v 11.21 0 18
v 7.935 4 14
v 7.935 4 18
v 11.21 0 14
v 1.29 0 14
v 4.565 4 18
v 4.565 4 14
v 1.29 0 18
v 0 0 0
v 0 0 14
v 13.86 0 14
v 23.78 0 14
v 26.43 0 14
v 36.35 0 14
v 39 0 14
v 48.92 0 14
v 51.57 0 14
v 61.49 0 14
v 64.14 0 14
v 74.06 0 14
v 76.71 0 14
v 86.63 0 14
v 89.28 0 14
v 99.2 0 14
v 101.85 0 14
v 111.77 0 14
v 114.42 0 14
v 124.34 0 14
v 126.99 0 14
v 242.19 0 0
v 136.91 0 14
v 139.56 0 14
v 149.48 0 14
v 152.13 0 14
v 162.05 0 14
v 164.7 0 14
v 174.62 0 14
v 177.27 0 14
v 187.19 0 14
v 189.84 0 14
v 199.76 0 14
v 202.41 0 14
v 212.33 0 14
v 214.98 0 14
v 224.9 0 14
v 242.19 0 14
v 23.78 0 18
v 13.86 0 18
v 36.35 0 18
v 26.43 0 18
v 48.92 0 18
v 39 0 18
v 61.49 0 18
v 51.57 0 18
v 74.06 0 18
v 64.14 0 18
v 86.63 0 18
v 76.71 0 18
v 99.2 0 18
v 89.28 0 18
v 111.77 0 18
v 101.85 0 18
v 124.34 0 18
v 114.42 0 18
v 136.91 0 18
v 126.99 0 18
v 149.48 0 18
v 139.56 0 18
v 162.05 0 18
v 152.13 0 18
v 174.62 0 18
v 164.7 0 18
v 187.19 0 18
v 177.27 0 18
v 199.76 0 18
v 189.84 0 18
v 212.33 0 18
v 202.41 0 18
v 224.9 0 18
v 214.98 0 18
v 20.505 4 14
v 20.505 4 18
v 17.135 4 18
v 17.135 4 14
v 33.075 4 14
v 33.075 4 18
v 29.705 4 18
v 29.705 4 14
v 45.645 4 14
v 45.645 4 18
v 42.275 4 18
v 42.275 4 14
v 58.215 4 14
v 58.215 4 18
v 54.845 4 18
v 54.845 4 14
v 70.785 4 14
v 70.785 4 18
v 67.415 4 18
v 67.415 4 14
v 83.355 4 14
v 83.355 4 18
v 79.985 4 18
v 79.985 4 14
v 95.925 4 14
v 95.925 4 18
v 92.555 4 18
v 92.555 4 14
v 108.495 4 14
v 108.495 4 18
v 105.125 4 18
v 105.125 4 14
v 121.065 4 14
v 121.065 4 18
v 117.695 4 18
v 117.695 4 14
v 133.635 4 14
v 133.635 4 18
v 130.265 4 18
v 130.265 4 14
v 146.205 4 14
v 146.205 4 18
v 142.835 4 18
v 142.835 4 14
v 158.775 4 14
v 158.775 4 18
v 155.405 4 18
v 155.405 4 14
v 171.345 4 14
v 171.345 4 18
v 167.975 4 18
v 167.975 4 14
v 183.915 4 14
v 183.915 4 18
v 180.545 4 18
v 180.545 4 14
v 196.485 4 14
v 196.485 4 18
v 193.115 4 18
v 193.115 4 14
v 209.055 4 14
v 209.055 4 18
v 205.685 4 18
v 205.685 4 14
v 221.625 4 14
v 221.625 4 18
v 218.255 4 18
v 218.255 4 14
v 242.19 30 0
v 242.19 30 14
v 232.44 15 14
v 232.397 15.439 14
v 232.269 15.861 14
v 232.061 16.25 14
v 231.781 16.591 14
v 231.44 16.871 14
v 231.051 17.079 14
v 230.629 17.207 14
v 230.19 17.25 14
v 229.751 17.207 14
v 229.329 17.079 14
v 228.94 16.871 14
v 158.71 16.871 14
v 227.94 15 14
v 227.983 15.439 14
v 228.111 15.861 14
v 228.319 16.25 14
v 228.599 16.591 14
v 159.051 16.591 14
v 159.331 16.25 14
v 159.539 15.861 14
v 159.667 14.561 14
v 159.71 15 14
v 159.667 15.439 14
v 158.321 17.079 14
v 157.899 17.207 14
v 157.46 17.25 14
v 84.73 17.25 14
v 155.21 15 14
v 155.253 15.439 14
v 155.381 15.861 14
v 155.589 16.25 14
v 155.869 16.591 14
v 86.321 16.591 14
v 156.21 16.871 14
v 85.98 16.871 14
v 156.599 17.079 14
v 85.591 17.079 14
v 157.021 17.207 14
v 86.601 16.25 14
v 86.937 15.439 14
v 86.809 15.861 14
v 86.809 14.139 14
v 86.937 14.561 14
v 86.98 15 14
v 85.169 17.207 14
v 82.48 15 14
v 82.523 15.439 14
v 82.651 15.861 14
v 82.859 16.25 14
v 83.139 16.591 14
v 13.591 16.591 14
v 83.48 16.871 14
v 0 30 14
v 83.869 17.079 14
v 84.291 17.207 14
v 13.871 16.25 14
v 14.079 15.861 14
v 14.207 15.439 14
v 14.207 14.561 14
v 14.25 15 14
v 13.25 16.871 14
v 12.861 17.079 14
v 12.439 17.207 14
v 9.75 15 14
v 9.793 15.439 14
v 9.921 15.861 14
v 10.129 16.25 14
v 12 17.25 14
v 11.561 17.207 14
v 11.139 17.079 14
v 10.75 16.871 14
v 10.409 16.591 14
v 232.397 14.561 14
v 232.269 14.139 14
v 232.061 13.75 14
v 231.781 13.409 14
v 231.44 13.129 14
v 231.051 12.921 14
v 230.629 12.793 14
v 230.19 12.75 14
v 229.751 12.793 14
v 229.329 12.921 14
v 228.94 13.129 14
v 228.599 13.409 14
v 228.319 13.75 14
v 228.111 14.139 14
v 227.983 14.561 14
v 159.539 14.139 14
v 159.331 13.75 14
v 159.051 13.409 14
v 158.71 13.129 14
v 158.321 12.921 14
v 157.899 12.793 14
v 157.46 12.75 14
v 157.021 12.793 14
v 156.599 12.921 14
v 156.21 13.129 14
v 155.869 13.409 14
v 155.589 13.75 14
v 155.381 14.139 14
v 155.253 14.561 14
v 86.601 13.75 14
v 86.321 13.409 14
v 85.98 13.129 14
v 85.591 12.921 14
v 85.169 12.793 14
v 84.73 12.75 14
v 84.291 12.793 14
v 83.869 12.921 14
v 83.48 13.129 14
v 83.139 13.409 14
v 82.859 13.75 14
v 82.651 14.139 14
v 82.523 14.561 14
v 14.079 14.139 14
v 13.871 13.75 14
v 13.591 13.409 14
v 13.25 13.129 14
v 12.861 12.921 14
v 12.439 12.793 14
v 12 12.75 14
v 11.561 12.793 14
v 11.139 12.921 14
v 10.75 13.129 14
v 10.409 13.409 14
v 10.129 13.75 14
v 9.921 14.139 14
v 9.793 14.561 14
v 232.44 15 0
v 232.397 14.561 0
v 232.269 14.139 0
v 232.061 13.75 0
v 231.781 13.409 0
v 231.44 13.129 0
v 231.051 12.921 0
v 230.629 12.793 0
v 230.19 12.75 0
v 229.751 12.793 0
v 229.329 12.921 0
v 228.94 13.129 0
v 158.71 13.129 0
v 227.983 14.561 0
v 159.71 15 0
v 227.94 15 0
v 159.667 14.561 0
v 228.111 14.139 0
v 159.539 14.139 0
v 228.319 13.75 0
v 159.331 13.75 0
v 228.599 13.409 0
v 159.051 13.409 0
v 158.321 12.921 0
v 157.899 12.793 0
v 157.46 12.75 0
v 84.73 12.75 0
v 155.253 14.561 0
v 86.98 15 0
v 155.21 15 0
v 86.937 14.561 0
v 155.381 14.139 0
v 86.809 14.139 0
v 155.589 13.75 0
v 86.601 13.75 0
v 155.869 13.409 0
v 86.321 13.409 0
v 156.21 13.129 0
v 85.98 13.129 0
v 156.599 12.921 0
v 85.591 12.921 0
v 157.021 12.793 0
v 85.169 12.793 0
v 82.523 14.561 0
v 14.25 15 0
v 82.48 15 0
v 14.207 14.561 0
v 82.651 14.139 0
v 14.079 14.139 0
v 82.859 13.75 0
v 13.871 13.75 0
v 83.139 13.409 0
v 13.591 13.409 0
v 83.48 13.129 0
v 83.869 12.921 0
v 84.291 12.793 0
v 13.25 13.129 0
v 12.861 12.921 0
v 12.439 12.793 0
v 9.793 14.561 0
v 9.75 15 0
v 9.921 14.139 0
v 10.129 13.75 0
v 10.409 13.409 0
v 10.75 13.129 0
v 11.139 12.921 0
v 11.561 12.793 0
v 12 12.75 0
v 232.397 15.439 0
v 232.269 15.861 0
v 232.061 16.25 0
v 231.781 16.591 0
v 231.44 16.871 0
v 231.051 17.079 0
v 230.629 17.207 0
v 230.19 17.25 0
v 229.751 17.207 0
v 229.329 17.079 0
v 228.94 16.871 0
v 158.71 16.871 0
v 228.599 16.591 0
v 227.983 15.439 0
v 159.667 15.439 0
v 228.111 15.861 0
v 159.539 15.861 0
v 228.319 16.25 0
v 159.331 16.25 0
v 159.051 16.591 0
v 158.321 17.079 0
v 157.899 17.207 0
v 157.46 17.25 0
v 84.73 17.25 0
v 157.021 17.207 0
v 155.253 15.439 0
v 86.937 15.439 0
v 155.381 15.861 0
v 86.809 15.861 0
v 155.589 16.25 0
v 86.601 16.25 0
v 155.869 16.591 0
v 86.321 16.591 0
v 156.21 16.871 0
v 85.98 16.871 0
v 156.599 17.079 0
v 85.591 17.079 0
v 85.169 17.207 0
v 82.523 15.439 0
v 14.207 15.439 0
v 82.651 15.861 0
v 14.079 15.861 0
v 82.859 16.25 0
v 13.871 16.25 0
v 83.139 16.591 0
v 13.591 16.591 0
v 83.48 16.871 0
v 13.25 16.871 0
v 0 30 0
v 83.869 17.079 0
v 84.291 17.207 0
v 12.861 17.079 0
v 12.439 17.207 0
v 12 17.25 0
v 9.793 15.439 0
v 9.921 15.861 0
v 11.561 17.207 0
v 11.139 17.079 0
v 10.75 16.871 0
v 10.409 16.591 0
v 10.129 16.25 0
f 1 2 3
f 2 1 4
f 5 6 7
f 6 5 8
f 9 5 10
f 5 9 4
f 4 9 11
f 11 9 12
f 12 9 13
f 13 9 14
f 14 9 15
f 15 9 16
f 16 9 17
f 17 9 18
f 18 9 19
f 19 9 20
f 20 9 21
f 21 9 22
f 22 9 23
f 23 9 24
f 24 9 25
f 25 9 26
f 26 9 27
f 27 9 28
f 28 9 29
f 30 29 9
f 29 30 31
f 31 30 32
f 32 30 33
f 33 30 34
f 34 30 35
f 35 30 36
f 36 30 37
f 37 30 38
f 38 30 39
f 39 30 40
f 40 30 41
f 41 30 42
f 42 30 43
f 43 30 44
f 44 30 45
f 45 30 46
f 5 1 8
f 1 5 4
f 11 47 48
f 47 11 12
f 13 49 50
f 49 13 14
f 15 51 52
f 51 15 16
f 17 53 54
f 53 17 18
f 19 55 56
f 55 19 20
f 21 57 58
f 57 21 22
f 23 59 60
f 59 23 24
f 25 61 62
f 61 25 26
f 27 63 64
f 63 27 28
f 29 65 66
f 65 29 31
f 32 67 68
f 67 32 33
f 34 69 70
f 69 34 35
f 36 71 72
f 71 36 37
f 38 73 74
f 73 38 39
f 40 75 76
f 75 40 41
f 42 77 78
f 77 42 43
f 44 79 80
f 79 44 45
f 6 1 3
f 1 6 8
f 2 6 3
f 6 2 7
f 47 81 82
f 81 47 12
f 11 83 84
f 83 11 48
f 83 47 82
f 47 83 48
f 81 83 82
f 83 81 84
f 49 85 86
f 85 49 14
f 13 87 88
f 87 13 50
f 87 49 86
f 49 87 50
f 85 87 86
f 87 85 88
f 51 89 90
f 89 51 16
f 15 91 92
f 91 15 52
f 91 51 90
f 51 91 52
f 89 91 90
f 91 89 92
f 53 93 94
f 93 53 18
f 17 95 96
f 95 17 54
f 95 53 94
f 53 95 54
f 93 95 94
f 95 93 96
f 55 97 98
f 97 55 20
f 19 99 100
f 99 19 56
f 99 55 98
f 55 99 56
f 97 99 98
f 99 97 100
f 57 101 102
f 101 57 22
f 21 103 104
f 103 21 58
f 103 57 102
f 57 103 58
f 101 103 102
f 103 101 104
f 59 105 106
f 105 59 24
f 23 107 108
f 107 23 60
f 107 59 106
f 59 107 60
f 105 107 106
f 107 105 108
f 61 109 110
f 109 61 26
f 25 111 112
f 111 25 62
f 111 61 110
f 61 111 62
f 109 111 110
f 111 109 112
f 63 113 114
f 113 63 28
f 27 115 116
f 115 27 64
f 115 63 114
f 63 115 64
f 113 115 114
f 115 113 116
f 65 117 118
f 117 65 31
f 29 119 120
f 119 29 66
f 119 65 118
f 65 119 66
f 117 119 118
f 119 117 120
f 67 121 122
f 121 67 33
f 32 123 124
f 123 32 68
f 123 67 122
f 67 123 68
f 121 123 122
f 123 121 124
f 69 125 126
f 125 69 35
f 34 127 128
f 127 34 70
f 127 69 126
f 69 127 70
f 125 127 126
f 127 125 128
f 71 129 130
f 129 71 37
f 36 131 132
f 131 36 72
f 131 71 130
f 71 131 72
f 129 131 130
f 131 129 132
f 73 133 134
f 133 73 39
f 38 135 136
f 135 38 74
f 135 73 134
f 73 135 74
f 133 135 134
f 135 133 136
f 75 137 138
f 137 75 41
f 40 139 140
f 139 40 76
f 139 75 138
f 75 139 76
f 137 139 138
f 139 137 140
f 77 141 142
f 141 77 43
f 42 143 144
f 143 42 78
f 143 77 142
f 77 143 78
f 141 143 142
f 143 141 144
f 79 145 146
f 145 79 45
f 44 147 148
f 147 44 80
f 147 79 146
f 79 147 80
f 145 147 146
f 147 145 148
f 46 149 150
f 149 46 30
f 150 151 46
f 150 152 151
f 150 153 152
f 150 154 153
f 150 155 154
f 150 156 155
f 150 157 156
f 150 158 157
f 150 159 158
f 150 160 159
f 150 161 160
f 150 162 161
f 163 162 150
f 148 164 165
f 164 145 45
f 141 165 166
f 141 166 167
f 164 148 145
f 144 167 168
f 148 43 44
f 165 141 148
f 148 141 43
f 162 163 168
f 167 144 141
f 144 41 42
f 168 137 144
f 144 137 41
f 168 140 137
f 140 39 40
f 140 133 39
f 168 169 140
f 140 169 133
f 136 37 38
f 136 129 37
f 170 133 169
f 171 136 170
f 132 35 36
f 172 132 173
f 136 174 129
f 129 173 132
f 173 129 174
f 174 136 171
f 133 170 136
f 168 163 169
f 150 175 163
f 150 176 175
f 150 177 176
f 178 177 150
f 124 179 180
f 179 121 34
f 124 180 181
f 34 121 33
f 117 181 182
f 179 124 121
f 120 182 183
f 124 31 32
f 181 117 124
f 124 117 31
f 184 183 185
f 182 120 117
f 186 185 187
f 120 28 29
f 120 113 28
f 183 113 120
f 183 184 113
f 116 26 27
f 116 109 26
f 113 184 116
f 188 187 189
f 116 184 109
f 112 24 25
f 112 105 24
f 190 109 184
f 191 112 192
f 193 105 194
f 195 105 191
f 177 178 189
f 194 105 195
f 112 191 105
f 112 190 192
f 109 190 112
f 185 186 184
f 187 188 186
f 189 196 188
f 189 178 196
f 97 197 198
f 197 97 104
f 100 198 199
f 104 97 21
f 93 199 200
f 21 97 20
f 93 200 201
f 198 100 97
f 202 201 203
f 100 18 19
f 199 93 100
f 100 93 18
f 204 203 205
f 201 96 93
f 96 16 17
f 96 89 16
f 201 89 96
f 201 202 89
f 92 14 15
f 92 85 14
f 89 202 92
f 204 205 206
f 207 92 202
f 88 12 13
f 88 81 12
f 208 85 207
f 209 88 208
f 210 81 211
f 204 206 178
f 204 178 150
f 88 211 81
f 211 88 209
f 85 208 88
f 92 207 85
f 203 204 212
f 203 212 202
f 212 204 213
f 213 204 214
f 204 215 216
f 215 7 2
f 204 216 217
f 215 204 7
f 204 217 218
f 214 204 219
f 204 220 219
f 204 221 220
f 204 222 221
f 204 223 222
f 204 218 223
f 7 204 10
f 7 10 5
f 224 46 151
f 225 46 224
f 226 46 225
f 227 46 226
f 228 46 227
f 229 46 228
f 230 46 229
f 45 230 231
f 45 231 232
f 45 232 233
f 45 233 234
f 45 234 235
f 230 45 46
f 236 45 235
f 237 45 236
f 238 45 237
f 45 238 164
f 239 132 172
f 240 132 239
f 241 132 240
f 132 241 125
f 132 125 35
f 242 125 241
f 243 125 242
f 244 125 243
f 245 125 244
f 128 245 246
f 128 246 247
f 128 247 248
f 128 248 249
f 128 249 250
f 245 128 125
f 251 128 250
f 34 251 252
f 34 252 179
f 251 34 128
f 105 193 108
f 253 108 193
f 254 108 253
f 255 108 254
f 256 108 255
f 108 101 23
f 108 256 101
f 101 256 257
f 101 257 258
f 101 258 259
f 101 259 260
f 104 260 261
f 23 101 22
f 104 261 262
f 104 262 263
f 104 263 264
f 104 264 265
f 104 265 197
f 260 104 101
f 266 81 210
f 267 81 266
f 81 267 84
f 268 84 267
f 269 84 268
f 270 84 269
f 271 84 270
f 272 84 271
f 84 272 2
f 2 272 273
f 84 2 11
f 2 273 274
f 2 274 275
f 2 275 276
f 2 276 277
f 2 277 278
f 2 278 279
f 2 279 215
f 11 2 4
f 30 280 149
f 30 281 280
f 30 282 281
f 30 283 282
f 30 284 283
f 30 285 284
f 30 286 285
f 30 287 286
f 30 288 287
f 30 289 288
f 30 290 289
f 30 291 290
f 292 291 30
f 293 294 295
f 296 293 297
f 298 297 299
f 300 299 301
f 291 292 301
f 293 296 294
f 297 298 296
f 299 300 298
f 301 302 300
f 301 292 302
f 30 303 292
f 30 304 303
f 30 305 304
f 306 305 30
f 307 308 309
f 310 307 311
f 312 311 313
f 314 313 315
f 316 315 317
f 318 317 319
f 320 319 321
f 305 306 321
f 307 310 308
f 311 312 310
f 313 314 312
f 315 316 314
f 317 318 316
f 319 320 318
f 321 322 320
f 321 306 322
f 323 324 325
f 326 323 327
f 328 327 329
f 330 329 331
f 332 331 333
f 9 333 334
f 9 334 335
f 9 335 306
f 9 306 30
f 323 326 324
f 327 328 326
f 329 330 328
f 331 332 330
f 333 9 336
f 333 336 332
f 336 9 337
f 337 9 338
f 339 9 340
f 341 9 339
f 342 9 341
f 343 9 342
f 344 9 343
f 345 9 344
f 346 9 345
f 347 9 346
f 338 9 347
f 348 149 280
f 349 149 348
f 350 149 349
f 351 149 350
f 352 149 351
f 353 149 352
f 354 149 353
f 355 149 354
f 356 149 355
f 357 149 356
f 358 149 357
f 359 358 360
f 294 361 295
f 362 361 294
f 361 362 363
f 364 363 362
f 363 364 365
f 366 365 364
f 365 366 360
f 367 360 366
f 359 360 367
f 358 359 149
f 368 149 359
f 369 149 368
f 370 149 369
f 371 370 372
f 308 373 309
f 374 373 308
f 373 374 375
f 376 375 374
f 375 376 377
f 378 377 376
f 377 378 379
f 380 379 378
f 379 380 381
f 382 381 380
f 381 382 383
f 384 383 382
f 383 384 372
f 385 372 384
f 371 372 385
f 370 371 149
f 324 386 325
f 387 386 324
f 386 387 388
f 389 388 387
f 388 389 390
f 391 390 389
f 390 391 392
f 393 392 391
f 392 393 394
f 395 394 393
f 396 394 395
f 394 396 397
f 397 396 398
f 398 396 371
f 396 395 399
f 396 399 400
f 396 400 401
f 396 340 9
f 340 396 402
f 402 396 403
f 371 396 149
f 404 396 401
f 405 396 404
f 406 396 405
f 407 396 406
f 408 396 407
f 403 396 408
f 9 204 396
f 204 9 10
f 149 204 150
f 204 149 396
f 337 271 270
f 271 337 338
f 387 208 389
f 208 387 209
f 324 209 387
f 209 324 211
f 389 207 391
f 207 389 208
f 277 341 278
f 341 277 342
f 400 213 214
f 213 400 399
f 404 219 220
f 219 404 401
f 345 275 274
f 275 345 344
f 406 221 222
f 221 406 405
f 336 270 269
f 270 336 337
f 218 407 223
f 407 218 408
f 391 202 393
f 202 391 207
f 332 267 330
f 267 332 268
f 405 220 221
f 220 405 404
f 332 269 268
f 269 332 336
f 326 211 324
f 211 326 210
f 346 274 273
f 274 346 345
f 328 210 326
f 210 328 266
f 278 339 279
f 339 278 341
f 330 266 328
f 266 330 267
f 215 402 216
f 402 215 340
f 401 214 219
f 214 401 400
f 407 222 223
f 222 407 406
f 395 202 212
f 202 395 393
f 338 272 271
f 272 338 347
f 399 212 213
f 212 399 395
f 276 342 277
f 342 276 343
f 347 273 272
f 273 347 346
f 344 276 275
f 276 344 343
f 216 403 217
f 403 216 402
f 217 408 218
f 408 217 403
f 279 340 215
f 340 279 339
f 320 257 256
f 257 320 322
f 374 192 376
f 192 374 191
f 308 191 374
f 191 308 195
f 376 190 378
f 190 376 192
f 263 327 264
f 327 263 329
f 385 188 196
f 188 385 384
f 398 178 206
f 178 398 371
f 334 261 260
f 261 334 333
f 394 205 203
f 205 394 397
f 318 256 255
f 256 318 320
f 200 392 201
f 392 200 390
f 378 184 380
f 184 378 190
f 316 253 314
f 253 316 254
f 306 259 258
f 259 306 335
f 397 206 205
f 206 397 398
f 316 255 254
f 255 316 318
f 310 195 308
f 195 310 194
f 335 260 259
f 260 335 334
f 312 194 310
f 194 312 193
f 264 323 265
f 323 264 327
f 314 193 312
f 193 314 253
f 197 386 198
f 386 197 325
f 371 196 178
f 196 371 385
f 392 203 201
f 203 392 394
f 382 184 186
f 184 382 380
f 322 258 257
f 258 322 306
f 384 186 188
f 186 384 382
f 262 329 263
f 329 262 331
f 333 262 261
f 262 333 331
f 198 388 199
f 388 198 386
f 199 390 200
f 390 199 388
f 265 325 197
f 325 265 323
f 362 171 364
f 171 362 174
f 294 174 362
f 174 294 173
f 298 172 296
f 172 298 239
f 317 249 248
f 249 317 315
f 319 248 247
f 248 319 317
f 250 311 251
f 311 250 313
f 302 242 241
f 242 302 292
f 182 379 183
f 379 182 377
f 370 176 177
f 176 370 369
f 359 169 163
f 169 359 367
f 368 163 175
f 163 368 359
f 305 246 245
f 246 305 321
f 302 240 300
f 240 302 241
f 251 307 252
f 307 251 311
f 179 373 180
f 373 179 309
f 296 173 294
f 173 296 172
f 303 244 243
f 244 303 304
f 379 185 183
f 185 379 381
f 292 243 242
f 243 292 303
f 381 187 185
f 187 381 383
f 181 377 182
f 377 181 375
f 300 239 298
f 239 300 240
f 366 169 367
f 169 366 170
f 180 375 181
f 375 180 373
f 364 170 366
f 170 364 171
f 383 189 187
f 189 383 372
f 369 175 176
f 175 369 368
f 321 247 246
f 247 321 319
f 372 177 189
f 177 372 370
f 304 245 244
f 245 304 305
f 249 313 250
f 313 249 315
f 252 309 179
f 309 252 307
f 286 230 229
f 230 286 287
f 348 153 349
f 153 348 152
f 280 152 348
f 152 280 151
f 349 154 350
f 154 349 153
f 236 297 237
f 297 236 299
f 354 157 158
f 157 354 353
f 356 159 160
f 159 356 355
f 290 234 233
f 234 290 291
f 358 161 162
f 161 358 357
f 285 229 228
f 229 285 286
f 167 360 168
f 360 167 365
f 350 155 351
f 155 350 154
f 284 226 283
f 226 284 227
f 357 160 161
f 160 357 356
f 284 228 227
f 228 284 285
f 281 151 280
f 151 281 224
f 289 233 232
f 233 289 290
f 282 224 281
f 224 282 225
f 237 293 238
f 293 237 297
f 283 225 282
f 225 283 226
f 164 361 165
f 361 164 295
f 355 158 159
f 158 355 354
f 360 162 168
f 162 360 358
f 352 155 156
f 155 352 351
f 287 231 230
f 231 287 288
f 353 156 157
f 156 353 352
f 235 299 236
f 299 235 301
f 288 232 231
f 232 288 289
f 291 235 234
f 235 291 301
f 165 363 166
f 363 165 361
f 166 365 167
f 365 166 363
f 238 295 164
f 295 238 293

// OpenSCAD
$fn = 32;

// ----------------------------------------------------------------------
// Gear rack: m=4 z=18, 242.19 x 30 x 18 mm
// ----------------------------------------------------------------------

// --- parameters (mm) ---
length = 242.19;          // rack length, X
width = 30;               // rack width, Y
height = 18;              // overall height, Z
module_m = 4;             // module
back_t = 14;              // tooth root line height
pitch = 12.57;            // circular pitch
tip_w = 3.37;             // tooth thickness at the tip
root_w = 9.92;            // tooth thickness at the root line
hole_d = 4.5;             // mounting hole
sink = 0.6;               // tooth root overlap into the body

tooth_span = 226.19;

module tooth(x0) {
  /* 20 deg flank profile, sunk into the body for a positive overlap */
  translate([x0, 0, back_t - sink])
    linear_extrude(height = height - back_t + sink)
      polygon(points = [[-root_w / 2, 0], [root_w / 2, 0],
                        [tip_w / 2, height - back_t],
                        [-tip_w / 2, height - back_t]]);
}

difference() {
  union() {
    cube([length, width, back_t]);
    for (i = [0 : 18 - 1])
      tooth((i + 0.5) * pitch + (tooth_span - 18 * pitch) / 2);
  }
  translate([12, 15, -1]) cylinder(h = back_t + 2, d = hole_d);
  translate([84.73, 15, -1]) cylinder(h = back_t + 2, d = hole_d);
  translate([157.46, 15, -1]) cylinder(h = back_t + 2, d = hole_d);
  translate([230.19, 15, -1]) cylinder(h = back_t + 2, d = hole_d);
}
